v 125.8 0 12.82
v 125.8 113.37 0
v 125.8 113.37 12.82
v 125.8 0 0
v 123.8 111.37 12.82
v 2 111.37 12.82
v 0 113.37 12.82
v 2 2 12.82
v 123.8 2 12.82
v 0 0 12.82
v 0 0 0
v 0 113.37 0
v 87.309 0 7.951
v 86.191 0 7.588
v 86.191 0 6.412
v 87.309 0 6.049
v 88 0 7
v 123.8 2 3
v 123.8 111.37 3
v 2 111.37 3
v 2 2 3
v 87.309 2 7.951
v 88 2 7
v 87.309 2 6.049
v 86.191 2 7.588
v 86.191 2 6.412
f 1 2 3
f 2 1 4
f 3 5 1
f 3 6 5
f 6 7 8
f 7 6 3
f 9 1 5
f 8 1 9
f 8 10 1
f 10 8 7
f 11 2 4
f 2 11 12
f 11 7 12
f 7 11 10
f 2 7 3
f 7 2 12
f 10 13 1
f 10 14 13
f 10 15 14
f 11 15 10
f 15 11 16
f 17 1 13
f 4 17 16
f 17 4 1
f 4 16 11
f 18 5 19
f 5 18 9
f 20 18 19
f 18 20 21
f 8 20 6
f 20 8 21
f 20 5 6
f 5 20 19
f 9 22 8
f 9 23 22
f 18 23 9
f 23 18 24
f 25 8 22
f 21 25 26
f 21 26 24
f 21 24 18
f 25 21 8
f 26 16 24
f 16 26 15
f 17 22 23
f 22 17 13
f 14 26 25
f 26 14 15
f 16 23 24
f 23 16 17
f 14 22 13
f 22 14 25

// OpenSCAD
difference()
{

    difference()
    {
        length = 125.8;
        width = 113.37;
        height = 12.82;
        wall = 2;
        brim = 2;
        floor = 3;
        cube([length,width,height]);
        translate([wall,brim,floor])
            cube([length - 2* wall,width - 2*brim, height - floor]);
    }
    screw = 1;
    screwlength = 6;
    screwdist = 87;
    screwheight = 6;
    translate([screwdist,3,13 - screwheight])
        rotate([90,0,0])
        {
            cylinder(r = screw,h=screwlength);
        }
}
